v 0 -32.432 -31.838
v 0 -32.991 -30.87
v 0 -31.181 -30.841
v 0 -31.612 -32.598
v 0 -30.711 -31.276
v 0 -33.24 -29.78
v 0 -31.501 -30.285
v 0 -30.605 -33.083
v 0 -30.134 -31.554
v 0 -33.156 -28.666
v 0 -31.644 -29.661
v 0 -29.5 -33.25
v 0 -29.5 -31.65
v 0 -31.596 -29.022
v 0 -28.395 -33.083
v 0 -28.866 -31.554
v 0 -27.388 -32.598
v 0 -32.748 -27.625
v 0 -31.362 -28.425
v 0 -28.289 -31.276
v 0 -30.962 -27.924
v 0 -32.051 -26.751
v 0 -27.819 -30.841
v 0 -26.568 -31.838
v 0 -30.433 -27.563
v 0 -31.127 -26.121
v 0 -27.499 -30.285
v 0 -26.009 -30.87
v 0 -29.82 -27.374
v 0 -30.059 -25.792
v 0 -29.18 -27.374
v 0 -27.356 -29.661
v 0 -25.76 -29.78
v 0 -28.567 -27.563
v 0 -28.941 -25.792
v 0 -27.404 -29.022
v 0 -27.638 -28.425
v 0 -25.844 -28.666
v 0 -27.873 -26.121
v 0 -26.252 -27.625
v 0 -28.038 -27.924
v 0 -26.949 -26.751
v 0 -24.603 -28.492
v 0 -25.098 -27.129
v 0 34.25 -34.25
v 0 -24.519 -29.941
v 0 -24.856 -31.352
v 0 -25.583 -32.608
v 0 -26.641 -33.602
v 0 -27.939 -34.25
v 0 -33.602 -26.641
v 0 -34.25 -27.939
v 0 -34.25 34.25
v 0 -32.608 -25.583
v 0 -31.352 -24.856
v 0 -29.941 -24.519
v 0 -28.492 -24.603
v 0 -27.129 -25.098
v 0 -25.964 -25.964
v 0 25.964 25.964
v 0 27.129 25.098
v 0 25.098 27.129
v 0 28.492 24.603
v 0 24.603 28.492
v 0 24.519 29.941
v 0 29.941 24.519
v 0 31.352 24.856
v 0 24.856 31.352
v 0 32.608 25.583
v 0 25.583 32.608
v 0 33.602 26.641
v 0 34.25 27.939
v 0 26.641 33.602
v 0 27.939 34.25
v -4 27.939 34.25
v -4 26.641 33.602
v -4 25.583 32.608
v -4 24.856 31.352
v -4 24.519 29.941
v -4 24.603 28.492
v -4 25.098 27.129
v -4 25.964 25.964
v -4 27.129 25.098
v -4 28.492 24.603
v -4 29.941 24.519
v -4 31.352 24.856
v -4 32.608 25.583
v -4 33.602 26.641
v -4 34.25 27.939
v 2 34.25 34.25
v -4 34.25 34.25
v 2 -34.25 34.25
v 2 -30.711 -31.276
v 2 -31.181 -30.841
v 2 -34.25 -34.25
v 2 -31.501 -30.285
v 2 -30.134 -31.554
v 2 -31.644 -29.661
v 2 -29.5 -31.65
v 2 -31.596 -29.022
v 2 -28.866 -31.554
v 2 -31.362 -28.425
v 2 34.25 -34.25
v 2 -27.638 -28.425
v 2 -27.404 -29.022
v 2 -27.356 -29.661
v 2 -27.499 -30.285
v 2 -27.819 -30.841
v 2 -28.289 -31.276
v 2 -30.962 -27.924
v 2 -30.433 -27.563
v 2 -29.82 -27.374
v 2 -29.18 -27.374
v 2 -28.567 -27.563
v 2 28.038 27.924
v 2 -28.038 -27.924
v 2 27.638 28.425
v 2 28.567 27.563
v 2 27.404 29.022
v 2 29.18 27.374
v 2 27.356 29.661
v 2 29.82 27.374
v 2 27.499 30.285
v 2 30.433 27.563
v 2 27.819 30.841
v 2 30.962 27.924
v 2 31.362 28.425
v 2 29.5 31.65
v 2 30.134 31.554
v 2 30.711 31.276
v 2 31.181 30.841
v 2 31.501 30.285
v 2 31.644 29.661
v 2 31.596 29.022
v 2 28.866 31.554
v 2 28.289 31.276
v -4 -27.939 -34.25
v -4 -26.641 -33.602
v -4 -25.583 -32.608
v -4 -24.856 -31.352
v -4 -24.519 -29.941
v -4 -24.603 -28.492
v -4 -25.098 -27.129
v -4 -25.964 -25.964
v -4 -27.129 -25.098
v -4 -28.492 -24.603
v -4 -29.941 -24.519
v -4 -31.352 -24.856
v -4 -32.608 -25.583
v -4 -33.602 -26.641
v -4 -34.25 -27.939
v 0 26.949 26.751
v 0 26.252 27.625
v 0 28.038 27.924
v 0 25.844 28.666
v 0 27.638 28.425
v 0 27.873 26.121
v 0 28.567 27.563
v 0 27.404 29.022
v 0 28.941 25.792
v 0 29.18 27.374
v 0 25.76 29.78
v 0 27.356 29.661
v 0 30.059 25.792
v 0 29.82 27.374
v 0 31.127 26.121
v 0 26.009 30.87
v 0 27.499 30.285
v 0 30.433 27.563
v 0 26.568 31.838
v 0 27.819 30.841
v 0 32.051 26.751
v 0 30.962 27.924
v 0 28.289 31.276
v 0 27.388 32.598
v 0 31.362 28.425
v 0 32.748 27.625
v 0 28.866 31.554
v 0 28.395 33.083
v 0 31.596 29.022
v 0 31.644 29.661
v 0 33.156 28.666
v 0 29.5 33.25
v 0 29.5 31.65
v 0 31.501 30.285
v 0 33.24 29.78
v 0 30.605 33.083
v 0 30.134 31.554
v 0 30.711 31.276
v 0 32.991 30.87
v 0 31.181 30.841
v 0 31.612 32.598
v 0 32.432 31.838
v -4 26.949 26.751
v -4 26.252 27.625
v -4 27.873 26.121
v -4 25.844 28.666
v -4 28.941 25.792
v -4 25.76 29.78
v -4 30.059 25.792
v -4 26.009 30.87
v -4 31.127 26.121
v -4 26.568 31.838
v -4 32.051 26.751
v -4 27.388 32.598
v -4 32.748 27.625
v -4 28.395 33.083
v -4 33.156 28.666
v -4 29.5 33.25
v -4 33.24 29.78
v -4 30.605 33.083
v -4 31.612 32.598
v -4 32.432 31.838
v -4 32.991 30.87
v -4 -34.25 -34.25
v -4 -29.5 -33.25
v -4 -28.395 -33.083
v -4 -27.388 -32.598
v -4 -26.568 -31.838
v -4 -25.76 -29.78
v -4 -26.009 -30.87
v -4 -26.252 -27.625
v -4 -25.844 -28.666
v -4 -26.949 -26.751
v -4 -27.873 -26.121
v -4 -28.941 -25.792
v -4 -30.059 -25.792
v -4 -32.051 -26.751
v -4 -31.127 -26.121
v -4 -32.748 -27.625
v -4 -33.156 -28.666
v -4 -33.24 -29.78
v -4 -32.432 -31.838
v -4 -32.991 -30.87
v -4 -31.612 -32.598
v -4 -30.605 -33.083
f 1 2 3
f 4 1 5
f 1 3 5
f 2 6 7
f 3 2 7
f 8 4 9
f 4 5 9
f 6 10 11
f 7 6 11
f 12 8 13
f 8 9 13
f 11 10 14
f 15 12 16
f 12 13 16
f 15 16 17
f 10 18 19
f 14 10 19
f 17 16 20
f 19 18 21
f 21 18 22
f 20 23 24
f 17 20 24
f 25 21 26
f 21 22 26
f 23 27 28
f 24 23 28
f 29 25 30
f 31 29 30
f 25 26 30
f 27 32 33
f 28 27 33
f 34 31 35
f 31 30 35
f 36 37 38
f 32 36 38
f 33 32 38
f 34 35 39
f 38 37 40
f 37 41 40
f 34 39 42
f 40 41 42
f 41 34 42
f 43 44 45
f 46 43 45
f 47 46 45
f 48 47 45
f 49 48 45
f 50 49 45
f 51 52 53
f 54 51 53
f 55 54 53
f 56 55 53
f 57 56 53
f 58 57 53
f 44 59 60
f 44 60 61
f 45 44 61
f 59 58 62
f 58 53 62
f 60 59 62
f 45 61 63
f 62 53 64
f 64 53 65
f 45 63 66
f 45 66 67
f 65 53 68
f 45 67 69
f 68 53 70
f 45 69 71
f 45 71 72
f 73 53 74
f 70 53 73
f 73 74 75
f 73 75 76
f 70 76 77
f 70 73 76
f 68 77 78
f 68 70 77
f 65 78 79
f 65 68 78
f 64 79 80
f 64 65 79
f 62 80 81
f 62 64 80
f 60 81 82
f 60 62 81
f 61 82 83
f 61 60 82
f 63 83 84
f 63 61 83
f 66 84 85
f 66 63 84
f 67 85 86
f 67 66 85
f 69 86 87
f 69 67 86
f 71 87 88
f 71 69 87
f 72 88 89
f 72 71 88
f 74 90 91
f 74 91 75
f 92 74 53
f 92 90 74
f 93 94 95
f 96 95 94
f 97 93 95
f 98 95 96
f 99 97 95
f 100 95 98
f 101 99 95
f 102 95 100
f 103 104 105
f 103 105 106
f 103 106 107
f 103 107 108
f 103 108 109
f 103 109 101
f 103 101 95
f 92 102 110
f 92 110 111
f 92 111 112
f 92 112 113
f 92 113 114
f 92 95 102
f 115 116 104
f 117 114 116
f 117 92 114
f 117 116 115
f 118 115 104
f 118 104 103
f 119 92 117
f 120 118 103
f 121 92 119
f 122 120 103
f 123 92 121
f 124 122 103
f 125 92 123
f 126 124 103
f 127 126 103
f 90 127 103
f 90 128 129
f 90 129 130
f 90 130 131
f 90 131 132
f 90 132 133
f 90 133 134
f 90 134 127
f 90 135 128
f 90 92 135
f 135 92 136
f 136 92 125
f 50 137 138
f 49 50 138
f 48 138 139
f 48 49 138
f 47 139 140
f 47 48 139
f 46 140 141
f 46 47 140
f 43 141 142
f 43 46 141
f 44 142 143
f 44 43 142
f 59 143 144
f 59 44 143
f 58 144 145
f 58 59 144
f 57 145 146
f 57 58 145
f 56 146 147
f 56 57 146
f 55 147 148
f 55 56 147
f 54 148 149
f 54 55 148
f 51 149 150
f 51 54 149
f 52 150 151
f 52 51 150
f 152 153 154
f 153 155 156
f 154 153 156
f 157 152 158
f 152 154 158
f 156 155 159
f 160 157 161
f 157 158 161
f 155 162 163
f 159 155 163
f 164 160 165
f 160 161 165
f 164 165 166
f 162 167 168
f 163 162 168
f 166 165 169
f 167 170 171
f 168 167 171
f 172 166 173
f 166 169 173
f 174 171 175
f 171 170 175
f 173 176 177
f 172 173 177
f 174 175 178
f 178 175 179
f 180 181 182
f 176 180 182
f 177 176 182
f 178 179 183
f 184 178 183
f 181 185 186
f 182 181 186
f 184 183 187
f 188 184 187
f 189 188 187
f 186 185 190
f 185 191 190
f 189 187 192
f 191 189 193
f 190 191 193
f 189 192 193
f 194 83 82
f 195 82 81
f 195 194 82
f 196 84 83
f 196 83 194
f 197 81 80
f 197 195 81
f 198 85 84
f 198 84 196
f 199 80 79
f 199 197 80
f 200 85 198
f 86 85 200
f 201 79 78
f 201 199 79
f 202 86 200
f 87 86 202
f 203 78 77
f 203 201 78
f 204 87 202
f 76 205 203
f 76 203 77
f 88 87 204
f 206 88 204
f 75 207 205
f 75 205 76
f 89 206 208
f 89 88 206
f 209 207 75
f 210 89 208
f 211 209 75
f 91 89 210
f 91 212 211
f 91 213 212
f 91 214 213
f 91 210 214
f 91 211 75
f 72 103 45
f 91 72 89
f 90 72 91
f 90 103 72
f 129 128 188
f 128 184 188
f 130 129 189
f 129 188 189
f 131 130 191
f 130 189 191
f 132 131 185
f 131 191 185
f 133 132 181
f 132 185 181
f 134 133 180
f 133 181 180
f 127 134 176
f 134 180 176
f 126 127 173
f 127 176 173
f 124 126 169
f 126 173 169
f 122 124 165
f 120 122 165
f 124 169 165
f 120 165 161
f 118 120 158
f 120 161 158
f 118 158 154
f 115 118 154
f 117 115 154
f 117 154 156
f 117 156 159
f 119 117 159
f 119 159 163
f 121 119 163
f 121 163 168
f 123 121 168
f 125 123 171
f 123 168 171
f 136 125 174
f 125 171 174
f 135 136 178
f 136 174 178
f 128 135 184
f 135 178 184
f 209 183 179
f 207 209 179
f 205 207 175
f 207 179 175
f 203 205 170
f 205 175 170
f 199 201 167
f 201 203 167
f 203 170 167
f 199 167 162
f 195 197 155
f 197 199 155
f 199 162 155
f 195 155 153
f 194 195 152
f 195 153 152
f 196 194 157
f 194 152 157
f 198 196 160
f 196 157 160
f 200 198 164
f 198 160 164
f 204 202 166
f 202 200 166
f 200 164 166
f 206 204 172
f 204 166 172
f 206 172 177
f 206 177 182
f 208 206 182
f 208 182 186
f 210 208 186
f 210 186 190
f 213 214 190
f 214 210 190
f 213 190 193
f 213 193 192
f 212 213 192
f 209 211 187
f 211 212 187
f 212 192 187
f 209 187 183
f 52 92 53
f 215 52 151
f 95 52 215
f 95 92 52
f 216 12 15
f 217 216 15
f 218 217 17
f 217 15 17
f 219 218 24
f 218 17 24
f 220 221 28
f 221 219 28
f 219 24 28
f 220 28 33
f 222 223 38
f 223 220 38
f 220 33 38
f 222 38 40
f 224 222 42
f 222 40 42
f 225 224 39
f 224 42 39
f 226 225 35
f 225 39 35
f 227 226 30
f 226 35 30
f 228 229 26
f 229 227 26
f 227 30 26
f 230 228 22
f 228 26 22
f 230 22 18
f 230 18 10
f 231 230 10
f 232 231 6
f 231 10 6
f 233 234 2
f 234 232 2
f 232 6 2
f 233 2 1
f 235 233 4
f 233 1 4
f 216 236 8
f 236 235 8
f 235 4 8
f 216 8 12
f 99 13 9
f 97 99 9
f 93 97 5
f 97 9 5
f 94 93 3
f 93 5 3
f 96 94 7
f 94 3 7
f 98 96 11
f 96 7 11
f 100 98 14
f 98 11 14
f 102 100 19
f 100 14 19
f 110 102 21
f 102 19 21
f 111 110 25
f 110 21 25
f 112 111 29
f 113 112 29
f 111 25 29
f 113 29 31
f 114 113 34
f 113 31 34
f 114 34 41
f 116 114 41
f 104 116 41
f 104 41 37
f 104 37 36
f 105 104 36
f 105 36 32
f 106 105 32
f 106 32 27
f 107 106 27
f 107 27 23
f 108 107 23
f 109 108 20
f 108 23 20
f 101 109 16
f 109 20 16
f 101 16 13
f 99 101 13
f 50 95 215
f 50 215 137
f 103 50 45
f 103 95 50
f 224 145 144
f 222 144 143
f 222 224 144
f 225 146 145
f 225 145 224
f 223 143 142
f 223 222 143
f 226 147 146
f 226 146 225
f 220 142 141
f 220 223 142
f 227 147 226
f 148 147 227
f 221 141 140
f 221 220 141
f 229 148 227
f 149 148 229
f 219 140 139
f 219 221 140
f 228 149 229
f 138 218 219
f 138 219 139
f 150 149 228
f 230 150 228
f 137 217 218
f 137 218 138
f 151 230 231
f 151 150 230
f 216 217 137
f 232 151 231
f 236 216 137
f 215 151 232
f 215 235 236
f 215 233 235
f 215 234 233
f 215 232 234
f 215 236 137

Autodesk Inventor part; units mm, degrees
ref_plane "YZ Plane" through (0, 0, 0) normal (1, 0, 0) x (0, 1, 0)
ref_plane "XZ Plane" through (0, 0, 0) normal (0, 1, 0) x (-1, 0, 0)
ref_plane "XY Plane" through (0, 0, 0) normal (0, 0, 1) x (1, 0, 0)
sketch "Sketch1" plane through (0, 0, 0) normal (1, 0, 0) x (0, 1, 0)
  line L0 (34.5, 34.5) -> (-34.5, 34.5)
  line L1 (-34.5, 34.5) -> (-34.5, -34.5)
  line L2 (-34.5, -34.5) -> (34.5, -34.5)
  line L3 (34.5, -34.5) -> (34.5, 34.5)
  line L4 (34.5, 34.5) -> (-34.5, -34.5) construction
  line L5 (-34.5, 34.5) -> (34.5, -34.5) construction
  point P0 (0, 0)
  dimension "d0" = 69
  dimension "d1" = 69
extrude "Extrusion1" add sketch "Sketch1" along normal blind 2
sketch "Sketch2" plane through (0, 0, 0) normal (-1, 0, 0) x (0, 0, 1)
  circle A0 centre (29.5, 29.5) radius 3.75
  circle A1 centre (29.5, 29.5) radius 5
  line L0 (-34.5, 34.5) -> (34.5, 34.5) projected
  line L1 (34.5, 34.5) -> (34.5, -34.5) projected
  circle A2 centre (29.5, 29.5) radius 2.15
  point P0 (0, 0)
  point P1 (34.5, 29.5)
  point P2 (29.5, 34.5)
  dimension "d4" = 7.5
  dimension "d5" = 10
  dimension "d6" = 5
  dimension "d7" = 5
  dimension "d10" = 4.3
extrude "Extrusion2" add sketch "Sketch2" along normal blind 4 contours A1 | A1 L0 L1
extrude "Extrusion3" cut sketch "Sketch2" against normal blind 4 contours A2
pattern_circular "Circular Pattern1" count 2 over 360 about axis through (-10, 0, 0) along (1, 0, 0) of "Extrusion2", "Extrusion3"
sketch "Sketch3" plane through (2, 0, 0) normal (1, 0, 0) x (0, 0, -1)
  circle A0 centre (29.5, -29.5) radius 2.15 projected
  circle A1 centre (-29.5, 29.5) radius 2.15 projected
  line L0 (-34.5, -34.5) -> (34.5, -34.5) projected
  line L1 (34.5, -34.5) -> (34.5, 34.5) projected
  line L2 (34.5, 34.5) -> (-34.5, 34.5) projected
  line L3 (-34.5, 34.5) -> (-34.5, -34.5) projected
  line L4 (-34.25, -34.25) -> (34.25, -34.25)
  line L5 (34.25, -34.25) -> (34.25, 34.25)
  line L6 (34.25, 34.25) -> (-34.25, 34.25)
  line L7 (-34.25, 34.25) -> (-34.25, -34.25)
  line L8 (-34.25, -34.25) -> (34.25, 34.25) construction
  line L9 (34.25, -34.25) -> (-34.25, 34.25) construction
  point P0 (0, 0)
  dimension "d16" = 0.25
  dimension "d17" = 0.25
extrude "Extrusion4" cut sketch "Sketch3" against normal through all contours L3 L2 L1 L0
properties part number "pokrywa_obudowa"
